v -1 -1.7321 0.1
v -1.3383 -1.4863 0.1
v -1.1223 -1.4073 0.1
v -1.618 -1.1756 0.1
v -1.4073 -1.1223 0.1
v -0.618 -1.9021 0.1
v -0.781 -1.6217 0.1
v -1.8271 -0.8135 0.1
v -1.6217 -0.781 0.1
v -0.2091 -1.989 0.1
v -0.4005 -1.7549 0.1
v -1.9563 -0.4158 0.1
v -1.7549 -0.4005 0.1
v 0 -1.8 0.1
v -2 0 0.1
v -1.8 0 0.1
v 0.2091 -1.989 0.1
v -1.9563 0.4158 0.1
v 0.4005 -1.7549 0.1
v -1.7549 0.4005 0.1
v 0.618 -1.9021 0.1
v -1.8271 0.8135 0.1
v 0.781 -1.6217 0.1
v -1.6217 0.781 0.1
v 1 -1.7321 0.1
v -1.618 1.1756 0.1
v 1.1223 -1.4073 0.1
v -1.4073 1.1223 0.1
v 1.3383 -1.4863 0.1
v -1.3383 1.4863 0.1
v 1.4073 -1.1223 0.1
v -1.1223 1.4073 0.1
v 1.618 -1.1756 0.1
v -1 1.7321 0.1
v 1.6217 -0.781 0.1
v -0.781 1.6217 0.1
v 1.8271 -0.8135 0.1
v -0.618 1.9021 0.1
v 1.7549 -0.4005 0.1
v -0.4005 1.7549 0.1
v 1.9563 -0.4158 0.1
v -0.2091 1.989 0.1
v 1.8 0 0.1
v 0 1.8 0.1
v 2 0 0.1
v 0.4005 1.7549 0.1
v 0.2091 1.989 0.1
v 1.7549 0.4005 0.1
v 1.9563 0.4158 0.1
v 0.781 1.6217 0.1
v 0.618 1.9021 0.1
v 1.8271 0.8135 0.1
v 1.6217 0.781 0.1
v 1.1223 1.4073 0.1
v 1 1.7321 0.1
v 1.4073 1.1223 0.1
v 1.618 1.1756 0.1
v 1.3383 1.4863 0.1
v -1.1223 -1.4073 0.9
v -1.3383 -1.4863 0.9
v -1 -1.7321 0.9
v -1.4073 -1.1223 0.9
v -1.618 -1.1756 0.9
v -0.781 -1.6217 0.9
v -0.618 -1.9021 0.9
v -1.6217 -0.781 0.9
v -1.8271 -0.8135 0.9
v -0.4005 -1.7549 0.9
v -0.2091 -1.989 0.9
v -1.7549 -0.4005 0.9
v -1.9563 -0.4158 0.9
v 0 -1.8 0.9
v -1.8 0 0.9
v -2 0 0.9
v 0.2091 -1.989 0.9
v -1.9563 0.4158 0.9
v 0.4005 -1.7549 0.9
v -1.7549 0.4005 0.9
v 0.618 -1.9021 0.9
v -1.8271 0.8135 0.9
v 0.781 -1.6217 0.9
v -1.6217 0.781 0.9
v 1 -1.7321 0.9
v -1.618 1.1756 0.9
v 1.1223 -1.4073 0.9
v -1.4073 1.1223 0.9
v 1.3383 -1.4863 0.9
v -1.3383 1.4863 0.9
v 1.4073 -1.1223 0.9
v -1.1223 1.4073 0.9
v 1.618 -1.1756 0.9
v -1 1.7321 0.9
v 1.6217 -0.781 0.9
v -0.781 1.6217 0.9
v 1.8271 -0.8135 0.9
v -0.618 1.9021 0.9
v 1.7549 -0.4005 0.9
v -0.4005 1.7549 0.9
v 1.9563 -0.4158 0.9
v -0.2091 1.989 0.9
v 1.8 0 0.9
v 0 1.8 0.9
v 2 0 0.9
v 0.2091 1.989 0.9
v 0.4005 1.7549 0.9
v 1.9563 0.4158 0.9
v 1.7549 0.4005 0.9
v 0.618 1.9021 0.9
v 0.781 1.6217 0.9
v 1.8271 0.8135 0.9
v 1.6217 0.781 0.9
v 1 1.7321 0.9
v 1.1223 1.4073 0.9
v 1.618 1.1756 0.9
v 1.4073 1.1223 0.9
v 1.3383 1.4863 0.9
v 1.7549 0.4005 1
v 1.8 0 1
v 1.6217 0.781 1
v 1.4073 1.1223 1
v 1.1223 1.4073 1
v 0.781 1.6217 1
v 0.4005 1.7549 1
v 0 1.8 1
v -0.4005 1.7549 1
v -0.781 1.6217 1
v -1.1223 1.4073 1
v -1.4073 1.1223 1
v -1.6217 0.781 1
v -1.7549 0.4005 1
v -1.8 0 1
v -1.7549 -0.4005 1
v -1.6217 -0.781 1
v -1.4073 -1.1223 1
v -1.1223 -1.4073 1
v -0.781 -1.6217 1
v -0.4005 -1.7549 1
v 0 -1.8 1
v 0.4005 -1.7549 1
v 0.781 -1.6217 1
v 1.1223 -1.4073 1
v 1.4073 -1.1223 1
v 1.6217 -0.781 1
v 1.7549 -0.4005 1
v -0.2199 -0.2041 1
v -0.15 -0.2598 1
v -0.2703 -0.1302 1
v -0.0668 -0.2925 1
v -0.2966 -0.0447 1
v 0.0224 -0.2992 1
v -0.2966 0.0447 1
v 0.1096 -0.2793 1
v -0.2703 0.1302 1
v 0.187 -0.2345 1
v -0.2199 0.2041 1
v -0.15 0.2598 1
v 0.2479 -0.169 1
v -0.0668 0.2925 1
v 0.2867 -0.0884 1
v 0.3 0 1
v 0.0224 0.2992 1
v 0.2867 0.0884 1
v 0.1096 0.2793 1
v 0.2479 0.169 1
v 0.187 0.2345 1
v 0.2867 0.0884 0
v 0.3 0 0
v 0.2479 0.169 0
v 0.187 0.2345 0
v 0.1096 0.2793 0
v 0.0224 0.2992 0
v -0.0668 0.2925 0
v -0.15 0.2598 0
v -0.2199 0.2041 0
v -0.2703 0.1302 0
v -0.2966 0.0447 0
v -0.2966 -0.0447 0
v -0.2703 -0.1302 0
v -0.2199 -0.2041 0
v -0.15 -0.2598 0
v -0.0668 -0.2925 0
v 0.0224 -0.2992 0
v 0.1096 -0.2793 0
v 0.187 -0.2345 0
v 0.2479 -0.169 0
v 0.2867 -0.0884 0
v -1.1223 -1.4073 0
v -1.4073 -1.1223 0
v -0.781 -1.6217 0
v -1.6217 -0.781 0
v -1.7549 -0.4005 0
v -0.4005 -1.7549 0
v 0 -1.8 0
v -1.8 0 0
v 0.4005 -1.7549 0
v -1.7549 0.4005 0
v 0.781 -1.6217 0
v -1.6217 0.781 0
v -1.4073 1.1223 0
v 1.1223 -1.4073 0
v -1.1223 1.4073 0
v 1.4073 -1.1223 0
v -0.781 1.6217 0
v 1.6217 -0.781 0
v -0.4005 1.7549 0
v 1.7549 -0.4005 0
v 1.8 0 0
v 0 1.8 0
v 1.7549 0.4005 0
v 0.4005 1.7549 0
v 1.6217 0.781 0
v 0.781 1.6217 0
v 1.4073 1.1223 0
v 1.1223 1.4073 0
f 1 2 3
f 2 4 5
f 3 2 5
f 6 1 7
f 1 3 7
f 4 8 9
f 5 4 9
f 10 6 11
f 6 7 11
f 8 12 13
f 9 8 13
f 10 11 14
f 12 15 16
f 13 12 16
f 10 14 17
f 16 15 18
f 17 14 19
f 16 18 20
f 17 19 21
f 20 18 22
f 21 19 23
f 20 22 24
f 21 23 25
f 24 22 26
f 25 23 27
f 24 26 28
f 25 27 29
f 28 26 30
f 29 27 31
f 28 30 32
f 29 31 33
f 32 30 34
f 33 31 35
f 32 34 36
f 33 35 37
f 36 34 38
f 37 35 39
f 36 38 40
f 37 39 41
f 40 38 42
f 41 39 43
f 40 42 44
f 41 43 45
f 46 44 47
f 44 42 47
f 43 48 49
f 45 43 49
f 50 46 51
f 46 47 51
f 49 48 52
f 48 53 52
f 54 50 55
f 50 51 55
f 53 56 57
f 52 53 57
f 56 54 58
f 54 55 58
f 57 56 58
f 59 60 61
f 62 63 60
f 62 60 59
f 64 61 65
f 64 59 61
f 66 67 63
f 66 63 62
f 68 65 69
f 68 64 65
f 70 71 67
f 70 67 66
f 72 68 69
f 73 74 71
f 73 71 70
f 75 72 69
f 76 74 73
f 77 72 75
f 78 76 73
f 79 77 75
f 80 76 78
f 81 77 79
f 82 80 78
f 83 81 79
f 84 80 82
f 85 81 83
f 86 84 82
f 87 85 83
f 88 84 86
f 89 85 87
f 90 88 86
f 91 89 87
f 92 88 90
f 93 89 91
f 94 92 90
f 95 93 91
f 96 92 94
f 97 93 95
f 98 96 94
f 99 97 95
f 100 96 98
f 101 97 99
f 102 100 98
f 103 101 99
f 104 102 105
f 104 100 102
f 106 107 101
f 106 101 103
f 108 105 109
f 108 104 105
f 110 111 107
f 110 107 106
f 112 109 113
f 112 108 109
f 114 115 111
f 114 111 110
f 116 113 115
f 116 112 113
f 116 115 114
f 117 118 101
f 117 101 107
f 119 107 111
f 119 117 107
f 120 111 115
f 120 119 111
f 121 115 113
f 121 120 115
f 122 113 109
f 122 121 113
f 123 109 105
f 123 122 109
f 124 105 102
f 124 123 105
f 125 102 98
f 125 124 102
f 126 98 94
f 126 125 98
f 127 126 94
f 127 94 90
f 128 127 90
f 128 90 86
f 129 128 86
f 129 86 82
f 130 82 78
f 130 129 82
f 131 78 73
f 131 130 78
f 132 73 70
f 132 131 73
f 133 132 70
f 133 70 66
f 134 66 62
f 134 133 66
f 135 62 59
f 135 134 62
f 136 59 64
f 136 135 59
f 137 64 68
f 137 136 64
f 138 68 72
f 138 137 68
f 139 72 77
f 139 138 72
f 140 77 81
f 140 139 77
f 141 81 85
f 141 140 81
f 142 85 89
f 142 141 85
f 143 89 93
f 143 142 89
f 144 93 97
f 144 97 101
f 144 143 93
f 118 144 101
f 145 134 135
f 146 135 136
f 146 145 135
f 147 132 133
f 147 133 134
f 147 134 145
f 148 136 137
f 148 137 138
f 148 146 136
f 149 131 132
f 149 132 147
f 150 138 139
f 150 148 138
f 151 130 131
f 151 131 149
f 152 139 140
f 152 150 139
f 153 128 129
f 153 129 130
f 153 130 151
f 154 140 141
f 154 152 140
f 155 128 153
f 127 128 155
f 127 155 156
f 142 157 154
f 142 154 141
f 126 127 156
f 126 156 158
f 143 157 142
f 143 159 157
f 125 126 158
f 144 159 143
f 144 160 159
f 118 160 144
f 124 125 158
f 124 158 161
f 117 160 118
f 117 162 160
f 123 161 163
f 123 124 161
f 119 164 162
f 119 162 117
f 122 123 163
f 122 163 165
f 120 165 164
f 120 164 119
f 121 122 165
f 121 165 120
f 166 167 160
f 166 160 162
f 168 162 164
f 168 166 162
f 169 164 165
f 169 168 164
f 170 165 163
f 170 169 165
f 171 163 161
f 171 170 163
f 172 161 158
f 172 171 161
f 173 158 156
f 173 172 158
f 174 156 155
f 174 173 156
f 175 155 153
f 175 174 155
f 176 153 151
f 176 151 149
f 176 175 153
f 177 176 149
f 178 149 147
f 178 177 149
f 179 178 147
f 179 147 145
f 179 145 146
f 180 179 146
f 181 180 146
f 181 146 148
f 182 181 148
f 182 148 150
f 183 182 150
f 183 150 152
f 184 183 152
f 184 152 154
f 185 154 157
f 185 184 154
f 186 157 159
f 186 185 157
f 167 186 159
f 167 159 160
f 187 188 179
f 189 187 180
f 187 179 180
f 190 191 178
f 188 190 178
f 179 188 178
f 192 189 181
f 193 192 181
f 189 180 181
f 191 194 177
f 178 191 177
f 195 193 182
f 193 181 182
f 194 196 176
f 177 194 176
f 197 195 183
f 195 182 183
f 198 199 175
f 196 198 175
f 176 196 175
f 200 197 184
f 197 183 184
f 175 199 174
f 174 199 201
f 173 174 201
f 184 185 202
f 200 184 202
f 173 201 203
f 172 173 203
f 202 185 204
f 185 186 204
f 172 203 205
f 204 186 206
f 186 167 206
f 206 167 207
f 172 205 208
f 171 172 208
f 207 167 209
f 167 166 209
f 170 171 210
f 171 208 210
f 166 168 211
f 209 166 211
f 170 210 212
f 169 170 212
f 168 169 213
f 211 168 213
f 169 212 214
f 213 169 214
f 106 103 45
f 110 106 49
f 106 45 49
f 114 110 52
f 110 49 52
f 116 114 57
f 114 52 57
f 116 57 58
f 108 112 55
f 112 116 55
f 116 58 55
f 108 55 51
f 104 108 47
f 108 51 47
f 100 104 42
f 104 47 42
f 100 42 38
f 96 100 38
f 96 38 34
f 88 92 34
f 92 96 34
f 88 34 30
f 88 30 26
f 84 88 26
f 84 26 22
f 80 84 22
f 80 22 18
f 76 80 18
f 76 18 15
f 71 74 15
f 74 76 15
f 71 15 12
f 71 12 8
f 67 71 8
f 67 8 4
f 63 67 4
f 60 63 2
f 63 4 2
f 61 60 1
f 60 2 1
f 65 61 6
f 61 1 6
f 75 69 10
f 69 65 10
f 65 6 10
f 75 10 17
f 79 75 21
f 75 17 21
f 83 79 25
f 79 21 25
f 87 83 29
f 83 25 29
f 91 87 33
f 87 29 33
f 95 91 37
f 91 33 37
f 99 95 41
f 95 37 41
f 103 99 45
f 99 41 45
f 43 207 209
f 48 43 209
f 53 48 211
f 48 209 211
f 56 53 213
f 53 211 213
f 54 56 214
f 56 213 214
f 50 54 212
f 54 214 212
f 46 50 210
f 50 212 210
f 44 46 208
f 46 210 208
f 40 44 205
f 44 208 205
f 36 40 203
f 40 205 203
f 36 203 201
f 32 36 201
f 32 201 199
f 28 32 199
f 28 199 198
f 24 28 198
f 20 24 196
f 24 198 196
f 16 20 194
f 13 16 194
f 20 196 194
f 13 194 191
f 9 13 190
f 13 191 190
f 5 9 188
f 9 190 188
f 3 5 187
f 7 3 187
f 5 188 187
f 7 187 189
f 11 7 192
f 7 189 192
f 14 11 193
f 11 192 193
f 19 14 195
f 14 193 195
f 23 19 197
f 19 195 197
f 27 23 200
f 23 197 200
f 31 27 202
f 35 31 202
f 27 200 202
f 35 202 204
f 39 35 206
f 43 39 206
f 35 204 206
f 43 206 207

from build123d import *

# Parameters (mm, degrees)
F0_R     = 2
F0_R_2   = 0.3
F1_DEPTH = 1
F2_R     = 2.010367
F2_R_2   = 1.8
F3_DEPTH = 0.1
F4_R     = 2
F4_R_2   = 1.8
F5_DEPTH = 0.1


with BuildPart() as f1:
    # F0 (on Top) → F1 (new body)
    with BuildSketch(Plane.XY):
        Circle(F0_R)
        Circle(F0_R_2, mode=Mode.SUBTRACT)
    extrude(amount=F1_DEPTH)

    # F2 (on face) → F3 (cut)
    with BuildSketch(Plane.XY.offset(1)):
        Circle(F2_R)
        Circle(F2_R_2, mode=Mode.SUBTRACT)
    extrude(amount=-F3_DEPTH, mode=Mode.SUBTRACT)

    # F4 (on face) → F5 (cut)
    with BuildSketch(Plane.XY):
        Circle(F4_R)
        Circle(F4_R_2, mode=Mode.SUBTRACT)
    extrude(amount=F5_DEPTH, mode=Mode.SUBTRACT)


solid = f1.part
